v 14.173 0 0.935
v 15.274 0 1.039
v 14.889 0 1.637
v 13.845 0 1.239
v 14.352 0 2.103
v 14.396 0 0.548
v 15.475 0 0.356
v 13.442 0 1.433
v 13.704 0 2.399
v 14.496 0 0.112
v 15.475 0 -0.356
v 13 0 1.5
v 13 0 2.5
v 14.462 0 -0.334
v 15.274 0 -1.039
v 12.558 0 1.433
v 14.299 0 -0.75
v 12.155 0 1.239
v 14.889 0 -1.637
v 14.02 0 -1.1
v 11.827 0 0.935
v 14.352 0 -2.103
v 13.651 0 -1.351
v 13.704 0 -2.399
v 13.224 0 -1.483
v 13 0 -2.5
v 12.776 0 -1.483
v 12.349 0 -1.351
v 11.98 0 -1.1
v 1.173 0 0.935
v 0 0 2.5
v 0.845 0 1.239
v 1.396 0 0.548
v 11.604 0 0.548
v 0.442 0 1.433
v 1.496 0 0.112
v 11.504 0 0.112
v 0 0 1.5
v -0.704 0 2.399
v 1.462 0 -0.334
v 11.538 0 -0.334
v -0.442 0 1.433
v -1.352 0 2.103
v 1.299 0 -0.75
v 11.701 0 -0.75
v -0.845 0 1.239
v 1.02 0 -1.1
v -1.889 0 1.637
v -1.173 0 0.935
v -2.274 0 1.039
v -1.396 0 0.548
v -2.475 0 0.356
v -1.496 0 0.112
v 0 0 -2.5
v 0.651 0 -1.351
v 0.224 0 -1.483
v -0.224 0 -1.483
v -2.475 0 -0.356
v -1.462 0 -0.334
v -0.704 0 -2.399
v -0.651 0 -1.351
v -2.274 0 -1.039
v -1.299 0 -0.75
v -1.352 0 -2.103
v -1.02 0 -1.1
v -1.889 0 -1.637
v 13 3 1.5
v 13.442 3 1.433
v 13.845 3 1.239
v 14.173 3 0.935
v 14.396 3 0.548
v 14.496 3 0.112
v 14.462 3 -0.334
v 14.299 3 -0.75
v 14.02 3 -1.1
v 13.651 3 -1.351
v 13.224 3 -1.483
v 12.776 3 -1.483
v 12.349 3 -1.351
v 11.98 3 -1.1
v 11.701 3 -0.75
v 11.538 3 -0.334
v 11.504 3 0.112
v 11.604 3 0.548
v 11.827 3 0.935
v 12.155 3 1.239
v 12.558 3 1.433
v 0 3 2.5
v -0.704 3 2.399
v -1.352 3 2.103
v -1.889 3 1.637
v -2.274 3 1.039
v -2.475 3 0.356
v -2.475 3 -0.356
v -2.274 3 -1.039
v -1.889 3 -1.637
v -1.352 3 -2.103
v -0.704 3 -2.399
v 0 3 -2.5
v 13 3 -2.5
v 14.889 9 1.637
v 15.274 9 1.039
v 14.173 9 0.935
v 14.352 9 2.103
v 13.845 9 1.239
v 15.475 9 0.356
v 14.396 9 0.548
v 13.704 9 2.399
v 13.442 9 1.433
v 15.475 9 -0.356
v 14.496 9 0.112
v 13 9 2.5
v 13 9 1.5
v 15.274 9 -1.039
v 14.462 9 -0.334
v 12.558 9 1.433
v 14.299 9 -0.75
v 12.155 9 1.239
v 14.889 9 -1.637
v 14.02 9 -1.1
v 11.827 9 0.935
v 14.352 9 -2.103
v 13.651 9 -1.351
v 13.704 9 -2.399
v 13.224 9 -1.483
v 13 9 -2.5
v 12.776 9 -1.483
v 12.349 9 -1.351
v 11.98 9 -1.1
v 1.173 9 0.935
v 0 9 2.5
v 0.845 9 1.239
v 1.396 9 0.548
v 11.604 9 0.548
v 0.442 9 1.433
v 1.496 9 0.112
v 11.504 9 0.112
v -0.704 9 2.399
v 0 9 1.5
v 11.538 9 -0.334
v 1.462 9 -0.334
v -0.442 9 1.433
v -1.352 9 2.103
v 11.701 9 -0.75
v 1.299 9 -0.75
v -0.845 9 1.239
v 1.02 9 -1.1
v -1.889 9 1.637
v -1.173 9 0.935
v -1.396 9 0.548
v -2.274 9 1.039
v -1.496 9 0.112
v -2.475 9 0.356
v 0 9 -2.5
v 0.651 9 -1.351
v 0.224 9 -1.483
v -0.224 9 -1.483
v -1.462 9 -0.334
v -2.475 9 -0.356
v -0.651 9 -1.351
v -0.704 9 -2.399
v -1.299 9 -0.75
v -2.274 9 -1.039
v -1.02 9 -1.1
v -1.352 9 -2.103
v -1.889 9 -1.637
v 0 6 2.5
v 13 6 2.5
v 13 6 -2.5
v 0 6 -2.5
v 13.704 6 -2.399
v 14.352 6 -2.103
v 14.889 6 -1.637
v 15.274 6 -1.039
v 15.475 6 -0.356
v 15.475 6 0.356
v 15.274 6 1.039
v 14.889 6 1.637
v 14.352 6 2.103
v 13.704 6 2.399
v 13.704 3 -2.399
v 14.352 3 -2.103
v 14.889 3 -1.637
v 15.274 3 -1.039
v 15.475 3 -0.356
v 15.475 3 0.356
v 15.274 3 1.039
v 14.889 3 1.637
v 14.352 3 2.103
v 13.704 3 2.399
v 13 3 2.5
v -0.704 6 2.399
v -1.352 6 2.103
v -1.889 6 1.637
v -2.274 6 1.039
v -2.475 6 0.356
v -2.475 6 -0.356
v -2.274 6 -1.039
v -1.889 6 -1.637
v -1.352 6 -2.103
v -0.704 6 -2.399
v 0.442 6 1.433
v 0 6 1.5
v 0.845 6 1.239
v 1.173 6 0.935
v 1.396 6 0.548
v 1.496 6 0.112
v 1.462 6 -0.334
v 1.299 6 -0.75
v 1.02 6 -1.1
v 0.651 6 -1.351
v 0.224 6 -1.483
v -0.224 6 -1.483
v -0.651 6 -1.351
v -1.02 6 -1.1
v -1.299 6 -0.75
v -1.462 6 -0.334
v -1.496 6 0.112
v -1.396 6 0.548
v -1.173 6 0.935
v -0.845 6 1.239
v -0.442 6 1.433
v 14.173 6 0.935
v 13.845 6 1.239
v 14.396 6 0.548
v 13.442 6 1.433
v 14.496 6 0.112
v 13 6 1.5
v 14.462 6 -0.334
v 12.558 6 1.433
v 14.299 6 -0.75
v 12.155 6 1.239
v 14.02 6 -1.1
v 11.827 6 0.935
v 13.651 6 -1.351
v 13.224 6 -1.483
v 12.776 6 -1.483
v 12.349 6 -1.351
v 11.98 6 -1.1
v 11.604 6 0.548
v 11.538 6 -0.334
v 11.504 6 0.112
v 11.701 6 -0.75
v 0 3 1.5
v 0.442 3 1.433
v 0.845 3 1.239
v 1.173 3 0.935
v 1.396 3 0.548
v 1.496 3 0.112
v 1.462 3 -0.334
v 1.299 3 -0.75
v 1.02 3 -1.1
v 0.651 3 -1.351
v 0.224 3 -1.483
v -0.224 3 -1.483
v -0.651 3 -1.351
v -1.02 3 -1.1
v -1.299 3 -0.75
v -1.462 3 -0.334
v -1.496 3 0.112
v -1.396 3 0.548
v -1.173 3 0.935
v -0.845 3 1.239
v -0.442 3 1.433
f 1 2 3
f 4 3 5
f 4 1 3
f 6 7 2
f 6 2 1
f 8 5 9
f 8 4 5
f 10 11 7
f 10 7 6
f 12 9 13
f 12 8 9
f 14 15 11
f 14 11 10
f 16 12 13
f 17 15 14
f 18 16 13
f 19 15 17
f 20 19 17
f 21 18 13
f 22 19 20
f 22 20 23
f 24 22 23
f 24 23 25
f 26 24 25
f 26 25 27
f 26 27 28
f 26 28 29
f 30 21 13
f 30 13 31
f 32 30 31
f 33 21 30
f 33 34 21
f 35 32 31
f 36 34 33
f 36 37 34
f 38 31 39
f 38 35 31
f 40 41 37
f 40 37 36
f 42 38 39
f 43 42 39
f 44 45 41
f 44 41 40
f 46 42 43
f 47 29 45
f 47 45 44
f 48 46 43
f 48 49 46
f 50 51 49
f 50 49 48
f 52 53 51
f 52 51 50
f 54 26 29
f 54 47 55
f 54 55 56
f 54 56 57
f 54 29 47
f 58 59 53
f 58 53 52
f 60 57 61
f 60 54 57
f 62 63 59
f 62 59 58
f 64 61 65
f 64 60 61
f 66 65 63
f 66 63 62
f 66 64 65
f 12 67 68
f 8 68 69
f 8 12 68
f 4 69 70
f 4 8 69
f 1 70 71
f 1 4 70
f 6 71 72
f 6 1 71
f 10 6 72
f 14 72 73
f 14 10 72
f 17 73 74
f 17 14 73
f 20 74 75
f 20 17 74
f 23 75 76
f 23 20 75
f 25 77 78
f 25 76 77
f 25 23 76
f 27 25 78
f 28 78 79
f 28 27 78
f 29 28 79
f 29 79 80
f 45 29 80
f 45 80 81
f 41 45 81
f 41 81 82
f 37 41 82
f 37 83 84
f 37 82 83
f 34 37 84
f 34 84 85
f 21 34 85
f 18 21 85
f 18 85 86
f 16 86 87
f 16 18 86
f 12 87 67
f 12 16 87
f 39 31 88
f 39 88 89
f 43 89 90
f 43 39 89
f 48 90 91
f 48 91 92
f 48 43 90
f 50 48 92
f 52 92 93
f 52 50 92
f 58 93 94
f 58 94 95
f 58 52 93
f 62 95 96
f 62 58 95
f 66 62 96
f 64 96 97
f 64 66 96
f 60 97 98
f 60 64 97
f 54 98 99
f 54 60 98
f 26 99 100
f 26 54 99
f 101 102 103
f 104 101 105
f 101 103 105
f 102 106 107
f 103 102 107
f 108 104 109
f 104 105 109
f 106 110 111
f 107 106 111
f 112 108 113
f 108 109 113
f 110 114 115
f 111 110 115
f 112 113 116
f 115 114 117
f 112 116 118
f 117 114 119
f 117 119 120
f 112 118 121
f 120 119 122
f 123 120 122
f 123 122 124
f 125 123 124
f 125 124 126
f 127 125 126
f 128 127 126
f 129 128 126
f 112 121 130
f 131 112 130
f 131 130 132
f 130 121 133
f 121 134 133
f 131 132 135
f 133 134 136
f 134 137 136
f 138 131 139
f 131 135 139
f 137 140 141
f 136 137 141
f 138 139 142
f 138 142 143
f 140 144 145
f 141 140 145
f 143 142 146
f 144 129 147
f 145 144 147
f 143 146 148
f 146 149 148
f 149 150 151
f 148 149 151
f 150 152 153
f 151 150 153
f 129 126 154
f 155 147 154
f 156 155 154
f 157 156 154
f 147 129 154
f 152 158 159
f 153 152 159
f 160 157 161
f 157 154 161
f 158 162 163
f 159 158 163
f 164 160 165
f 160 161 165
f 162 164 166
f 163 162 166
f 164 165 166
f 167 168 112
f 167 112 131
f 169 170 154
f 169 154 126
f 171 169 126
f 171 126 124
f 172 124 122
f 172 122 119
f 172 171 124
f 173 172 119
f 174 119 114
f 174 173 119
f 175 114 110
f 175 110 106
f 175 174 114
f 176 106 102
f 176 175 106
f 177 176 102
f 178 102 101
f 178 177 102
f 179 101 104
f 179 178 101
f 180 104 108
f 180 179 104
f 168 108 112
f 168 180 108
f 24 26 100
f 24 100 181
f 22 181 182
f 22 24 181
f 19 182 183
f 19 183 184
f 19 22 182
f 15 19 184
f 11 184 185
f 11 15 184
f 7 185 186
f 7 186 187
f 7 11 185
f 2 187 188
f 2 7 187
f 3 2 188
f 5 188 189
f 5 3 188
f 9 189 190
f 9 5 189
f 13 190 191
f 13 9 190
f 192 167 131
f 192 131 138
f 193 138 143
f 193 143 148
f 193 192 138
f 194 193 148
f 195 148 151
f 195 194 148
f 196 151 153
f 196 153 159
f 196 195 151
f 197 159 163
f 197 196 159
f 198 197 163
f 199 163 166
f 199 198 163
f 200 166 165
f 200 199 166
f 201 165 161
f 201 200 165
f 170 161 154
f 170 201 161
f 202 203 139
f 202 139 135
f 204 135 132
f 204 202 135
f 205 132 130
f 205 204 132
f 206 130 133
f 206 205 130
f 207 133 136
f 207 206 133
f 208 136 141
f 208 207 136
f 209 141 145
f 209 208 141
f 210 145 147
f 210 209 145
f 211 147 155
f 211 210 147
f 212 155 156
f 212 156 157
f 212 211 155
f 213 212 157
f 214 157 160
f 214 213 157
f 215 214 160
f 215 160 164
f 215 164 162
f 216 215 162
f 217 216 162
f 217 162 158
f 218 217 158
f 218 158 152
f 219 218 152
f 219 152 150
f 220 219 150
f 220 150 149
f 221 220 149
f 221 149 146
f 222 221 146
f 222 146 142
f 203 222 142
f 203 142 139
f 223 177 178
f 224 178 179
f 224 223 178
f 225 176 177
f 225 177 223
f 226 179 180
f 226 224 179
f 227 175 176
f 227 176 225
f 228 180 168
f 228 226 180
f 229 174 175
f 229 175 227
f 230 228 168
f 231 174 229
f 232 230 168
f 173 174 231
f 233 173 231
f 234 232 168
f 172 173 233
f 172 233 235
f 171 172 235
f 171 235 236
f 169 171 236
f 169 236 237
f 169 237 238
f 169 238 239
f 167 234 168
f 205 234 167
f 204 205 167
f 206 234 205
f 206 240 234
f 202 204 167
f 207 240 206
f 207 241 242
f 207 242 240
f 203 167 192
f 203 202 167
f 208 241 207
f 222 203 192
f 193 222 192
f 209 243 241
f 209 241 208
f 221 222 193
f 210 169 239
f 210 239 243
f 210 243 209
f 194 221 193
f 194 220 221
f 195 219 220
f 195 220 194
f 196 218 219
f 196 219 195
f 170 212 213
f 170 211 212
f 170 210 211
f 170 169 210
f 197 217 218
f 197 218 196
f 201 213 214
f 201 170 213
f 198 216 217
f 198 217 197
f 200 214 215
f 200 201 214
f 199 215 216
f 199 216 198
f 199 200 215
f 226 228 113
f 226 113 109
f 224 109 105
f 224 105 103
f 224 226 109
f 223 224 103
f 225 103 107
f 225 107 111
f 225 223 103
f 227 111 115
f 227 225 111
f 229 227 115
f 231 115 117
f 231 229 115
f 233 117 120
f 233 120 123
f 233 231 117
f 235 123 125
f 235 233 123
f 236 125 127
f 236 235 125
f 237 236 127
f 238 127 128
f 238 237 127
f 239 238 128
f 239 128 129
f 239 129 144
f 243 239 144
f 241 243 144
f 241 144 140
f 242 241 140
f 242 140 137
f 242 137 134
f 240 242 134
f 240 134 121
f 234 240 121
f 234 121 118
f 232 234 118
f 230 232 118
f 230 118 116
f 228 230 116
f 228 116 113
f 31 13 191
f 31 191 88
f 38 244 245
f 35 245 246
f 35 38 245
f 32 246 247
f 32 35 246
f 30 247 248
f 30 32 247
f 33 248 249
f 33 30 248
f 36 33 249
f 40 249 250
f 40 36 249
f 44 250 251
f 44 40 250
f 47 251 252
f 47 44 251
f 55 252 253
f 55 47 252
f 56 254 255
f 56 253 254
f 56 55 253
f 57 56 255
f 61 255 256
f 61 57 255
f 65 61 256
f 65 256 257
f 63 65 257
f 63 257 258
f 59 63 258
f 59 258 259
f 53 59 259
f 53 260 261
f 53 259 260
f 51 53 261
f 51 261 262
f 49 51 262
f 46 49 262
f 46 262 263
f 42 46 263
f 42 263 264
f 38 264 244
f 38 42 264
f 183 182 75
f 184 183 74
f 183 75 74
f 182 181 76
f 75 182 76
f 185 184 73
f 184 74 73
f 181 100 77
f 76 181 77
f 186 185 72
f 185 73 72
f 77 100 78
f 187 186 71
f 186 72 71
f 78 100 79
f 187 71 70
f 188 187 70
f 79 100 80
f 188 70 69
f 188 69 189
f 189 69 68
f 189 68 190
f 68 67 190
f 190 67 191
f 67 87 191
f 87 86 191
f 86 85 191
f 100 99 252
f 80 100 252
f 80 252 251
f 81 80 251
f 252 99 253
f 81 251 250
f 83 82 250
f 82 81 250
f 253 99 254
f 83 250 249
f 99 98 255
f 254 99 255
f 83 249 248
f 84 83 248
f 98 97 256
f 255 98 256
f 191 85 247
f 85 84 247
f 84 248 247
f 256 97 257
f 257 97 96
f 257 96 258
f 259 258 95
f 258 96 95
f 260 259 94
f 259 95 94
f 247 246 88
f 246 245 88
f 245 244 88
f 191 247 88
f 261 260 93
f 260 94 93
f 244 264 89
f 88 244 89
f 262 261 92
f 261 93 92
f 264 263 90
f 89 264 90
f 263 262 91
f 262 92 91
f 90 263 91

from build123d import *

# Parameters (mm, degrees)
SKETCH1_R           = 1.5
BOSS_EXTRUDE1_DEPTH = 9
SKETCH2_W           = 6
SKETCH2_H           = 3
CUT_EXTRUDE1_DEPTH  = 19.607794066
CHAMFER1_SIZE       = 1
SKETCH3_W           = 5
SKETCH3_H           = 3
CUT_EXTRUDE2_DEPTH  = 9


with BuildPart() as part:
    # Sketch1 → Boss-Extrude1 (new body)
    with BuildSketch(Plane(origin=(0, 0, 0), x_dir=(1, 0, 0), z_dir=(0, 1, 0))):
        with BuildLine():
            Line((0, 2.5), (13, 2.5))
            ThreePointArc((13, 2.5), (15.5, 0), (13, -2.5))
            Line((13, -2.5), (0, -2.5))
            ThreePointArc((0, -2.5), (-2.5, 0), (0, 2.5))
        make_face()
        with Locations(Location((0, 0, 0), (0, 0, 270))):
            Circle(SKETCH1_R, mode=Mode.SUBTRACT)
        with Locations(Location((13, 0, 0), (0, 0, 270))):
            Circle(SKETCH1_R, mode=Mode.SUBTRACT)
    extrude(amount=BOSS_EXTRUDE1_DEPTH)

    # Sketch2 → Cut-Extrude1 (cut, through all)
    with BuildSketch(Plane(origin=(0, 0, -2.5), x_dir=(-1, 0, 0), z_dir=(0, 0, -1))):
        with Locations((-13, 4.5)):
            Rectangle(SKETCH2_W, SKETCH2_H)
        with Locations((0, 4.5)):
            Rectangle(SKETCH2_W, SKETCH2_H)
    extrude(amount=-CUT_EXTRUDE1_DEPTH, mode=Mode.SUBTRACT)

    # Chamfer1
    chamfer1_edges = [part.edges().sort_by_distance(p)[0] for p in [
        (10, 4.5, 2.5),
        (10, 4.5, -2.5),
        (3, 4.5, -2.5),
        (3, 4.5, 2.5),
    ]]
    chamfer(chamfer1_edges, length=CHAMFER1_SIZE)

    # Sketch3 → Cut-Extrude2 (cut)
    with BuildSketch(Plane.ZY.offset(-3)):
        with Locations((0, 4.5)):
            Rectangle(SKETCH3_W, SKETCH3_H)
    extrude(amount=-CUT_EXTRUDE2_DEPTH, mode=Mode.SUBTRACT)


with BuildPart() as cut_extrude2_piece_1:
    # of the separate pieces the step leaves, piece 1, a body of its own (cut_extrude2_pieces)
    add(part.part.solids().sort_by_distance((13, 6, -2.5))[0])


with BuildPart() as cut_extrude2_piece_2:
    # of the separate pieces the step leaves, piece 2, a body of its own (cut_extrude2_pieces)
    add(part.part.solids().sort_by_distance((0, 3, -2.5))[0])


solid = Compound([cut_extrude2_piece_1.part, cut_extrude2_piece_2.part])
